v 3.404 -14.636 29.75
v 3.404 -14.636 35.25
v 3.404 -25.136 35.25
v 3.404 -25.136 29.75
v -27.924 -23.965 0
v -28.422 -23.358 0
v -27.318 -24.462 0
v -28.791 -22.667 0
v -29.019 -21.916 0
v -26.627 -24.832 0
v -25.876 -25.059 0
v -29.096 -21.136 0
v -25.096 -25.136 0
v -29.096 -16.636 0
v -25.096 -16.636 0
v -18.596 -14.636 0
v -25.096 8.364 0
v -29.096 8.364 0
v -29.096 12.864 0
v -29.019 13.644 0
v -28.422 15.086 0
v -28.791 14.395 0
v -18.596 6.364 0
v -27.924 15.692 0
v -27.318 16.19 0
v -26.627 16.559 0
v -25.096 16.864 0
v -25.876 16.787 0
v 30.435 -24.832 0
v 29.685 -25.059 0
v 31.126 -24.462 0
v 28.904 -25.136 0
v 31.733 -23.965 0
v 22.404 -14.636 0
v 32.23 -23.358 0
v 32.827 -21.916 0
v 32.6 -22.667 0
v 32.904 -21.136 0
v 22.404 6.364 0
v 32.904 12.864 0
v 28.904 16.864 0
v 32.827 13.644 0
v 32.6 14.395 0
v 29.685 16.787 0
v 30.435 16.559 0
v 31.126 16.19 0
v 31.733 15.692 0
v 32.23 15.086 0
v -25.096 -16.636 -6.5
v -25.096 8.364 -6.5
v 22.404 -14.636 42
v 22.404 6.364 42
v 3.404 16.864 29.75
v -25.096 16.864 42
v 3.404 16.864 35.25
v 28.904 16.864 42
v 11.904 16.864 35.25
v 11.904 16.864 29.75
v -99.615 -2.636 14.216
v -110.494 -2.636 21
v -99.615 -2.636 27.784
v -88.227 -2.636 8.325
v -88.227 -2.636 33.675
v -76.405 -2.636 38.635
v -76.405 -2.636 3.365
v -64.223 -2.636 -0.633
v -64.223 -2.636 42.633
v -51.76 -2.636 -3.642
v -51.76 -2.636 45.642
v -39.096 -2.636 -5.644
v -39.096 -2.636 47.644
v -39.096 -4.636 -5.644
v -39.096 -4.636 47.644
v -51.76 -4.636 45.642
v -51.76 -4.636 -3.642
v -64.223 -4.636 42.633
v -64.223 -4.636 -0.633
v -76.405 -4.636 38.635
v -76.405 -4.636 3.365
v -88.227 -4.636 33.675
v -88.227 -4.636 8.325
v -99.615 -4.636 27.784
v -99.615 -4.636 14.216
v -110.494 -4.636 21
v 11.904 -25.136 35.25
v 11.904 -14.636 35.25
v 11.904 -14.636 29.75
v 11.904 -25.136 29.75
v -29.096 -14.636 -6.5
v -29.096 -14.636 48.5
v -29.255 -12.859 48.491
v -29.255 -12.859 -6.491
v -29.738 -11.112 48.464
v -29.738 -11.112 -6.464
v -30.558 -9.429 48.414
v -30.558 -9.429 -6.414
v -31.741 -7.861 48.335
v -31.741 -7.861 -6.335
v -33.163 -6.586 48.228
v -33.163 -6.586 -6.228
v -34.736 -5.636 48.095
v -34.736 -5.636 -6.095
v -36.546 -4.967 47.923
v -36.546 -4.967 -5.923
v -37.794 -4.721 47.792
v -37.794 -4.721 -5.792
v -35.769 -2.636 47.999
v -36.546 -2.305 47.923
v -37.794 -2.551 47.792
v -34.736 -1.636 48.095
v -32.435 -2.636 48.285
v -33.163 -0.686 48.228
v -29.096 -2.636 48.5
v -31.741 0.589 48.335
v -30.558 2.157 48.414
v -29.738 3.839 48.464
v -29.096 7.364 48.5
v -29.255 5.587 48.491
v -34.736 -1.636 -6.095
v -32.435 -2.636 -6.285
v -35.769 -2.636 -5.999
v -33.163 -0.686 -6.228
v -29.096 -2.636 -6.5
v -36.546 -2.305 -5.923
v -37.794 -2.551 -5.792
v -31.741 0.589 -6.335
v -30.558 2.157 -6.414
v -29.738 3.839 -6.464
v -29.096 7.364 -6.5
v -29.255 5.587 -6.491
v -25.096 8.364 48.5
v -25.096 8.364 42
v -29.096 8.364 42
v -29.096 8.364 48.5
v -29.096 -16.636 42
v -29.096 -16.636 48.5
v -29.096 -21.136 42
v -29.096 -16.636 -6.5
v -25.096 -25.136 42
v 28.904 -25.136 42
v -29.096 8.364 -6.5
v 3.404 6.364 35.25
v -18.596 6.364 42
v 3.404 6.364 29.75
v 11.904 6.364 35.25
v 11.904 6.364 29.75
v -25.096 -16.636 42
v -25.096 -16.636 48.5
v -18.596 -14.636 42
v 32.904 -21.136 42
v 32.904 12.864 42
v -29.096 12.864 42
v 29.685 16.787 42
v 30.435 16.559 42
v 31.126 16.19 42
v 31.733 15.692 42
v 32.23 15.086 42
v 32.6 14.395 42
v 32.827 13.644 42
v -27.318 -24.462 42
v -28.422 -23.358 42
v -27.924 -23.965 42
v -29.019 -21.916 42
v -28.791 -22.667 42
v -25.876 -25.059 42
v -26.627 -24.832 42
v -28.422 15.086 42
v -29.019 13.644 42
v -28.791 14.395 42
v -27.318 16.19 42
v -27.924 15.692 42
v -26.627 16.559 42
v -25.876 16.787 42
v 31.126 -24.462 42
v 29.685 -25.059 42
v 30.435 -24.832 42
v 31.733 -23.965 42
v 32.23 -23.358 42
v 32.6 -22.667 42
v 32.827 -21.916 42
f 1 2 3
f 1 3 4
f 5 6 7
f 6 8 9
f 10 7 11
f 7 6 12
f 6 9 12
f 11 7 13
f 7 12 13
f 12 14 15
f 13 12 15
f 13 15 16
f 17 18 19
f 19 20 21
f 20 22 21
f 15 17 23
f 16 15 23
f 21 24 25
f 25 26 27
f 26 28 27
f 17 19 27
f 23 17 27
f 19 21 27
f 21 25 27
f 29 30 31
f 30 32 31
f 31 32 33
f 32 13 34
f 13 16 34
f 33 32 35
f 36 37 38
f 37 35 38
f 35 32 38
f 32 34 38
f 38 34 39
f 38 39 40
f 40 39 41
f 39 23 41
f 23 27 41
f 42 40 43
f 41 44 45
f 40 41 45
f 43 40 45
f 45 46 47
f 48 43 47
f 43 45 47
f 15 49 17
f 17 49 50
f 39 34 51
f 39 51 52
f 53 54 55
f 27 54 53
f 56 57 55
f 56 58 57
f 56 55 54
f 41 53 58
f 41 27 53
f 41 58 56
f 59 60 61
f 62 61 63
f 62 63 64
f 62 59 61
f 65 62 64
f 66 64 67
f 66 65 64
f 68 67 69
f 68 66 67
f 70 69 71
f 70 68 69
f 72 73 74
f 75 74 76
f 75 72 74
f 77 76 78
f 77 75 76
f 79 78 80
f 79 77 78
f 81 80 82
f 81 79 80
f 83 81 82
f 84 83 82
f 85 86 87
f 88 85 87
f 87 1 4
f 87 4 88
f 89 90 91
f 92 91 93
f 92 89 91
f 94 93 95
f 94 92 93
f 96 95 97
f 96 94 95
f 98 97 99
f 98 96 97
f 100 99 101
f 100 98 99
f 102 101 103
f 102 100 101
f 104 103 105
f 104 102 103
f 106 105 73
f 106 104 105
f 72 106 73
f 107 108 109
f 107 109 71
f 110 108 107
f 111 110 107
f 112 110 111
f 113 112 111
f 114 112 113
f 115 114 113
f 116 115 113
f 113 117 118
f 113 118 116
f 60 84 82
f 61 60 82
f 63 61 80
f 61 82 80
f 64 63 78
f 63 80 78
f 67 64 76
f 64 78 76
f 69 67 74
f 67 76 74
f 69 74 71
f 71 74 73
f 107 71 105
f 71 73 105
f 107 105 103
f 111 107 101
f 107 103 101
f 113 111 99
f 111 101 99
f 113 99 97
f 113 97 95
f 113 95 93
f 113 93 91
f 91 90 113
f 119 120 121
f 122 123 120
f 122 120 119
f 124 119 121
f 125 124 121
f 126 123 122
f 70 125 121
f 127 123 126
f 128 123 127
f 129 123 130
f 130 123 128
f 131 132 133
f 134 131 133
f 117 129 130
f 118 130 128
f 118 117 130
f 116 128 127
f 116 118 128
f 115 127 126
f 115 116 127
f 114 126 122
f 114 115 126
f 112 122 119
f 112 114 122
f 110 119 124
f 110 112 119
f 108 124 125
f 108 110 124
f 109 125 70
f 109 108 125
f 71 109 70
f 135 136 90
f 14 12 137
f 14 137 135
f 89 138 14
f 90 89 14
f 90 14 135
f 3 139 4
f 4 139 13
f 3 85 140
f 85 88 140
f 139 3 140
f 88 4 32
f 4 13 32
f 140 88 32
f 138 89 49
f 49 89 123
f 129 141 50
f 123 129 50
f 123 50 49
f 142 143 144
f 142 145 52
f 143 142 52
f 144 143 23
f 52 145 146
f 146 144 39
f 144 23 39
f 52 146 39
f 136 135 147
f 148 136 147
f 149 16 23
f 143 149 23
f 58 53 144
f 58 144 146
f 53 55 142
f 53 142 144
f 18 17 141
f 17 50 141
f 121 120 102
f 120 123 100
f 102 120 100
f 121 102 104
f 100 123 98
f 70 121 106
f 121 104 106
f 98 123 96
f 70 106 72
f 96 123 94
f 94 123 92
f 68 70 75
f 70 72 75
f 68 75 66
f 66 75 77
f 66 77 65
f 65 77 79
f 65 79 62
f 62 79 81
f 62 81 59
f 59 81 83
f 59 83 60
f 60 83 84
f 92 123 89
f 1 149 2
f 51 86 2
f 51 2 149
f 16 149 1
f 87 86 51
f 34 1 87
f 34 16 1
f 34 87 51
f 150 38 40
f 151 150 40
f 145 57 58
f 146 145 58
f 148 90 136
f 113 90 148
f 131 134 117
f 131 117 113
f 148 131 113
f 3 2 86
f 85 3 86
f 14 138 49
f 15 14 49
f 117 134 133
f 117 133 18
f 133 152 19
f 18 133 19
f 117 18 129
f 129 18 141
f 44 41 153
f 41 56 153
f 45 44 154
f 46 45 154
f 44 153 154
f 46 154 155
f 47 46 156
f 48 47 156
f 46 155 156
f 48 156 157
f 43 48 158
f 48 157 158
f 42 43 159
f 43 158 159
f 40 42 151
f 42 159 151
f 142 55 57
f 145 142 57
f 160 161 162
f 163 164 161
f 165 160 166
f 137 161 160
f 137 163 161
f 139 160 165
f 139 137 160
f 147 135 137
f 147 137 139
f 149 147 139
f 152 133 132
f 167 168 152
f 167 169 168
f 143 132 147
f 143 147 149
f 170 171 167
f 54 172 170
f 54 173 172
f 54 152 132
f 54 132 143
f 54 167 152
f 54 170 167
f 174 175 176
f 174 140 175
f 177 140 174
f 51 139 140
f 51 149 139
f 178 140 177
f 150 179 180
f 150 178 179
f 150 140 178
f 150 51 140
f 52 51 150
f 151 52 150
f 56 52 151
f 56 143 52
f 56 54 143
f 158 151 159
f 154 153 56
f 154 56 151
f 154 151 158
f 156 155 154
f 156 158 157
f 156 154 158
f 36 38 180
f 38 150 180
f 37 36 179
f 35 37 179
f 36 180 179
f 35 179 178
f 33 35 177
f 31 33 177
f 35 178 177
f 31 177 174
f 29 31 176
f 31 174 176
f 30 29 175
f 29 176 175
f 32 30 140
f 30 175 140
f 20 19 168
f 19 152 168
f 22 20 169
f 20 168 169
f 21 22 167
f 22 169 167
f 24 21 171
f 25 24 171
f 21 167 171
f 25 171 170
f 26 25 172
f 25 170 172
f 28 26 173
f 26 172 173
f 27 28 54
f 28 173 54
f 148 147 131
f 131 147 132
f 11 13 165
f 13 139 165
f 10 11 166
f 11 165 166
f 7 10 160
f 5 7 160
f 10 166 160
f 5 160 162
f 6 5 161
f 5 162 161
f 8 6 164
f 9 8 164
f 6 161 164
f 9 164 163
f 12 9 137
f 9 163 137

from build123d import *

# Parameters (mm, degrees)
SKETCH1_W           = 62
SKETCH1_H           = 42
SKETCH1_W_2         = 41
SKETCH1_H_2         = 21
BOSS_EXTRUDE1_DEPTH = 42
SKETCH2_W           = 4
SKETCH2_H           = 25
BOSS_EXTRUDE2_DEPTH = 4.5
SKETCH2_2_W         = 4
SKETCH2_2_H         = 25
BOSS_EXTRUDE3_DEPTH = 45.55
SKETCH3_W           = 4
SKETCH3_H           = 25
BOSS_EXTRUDE6_DEPTH = 2
BOSS_EXTRUDE7_START = -53
SKETCH3_8_W         = 4
SKETCH3_8_H         = 25
BOSS_EXTRUDE7_DEPTH = 53
CUT_EXTRUDE1_START  = -51
CUT_EXTRUDE1_DEPTH  = 51
SKETCH_1_W          = 8.5
SKETCH_1_H          = 5.5
CUT_EXTRUDE_1_DEPTH = 42
FILLET_3_R          = 4
FILLET_4_R          = 4
FILLET_5_R          = 4
FILLET_6_R          = 4
CUT_EXTRUDE3_DEPTH  = 55
BOSS_EXTRUDE8_DEPTH = 21.5
CUT_EXTRUDE4_DEPTH  = 19.5
FILLET_START        = -14.636072995
FILLET_7_DEPTH      = 10.0000001
FILLET_START_2      = -8
FILLET_7_2_DEPTH    = 57
FILLET_8_R          = 10


with BuildPart() as part:
    # Sketch1 → Boss-Extrude1 (new body)
    with BuildSketch(Plane.XY):
        with Locations((1.904162196, -4.136072895)):
            Rectangle(SKETCH1_W, SKETCH1_H)
        with Locations((1.904162196, -4.136072895)):
            Rectangle(SKETCH1_W_2, SKETCH1_H_2, mode=Mode.SUBTRACT)
    extrude(amount=BOSS_EXTRUDE1_DEPTH)

    # Sketch2 → Boss-Extrude2 (add)
    with BuildSketch(Plane.XY.offset(42)):
        with Locations((-27.095837804, -4.136072895)):
            Rectangle(SKETCH2_W, SKETCH2_H)
    extrude(amount=BOSS_EXTRUDE2_DEPTH)

    # Sketch2<2> → Boss-Extrude3 (add)
    with BuildSketch(Plane.XY.offset(42)):
        with Locations((-27.095837804, -4.136072895)):
            Rectangle(SKETCH2_2_W, SKETCH2_2_H)
    extrude(amount=-BOSS_EXTRUDE3_DEPTH)

    # Sketch3 → Boss-Extrude6 (add)
    # profile 1 of 3: a face of its own
    with BuildSketch(Plane.XY.offset(46.5)):
        with BuildLine():
            Line((-60.095837804, 4.463927105), (-60.095837804, 8.363927105))
            ThreePointArc((-60.095837804, 8.363927105), (-72.595837804, -4.136072895), (-60.095837804, -16.636072895))
            Line((-60.095837804, -16.636072895), (-60.095837804, -13.176248856))
            Line((-60.095837804, -13.176248856), (-60.555926168, -13.176248856))
            ThreePointArc((-60.555926168, -13.176248856), (-62.055926168, -11.676248856), (-60.555926168, -10.176248856))
            Line((-60.555926168, -10.176248856), (-60.095837804, -10.176248856))
            Line((-60.095837804, -10.176248856), (-60.095837804, -8.186072895))
            ThreePointArc((-60.095837804, -8.186072895), (-64.145837804, -4.136072895), (-60.095837804, -0.086072895))
            Line((-60.095837804, -0.086072895), (-60.095837804, 1.463927105))
            Line((-60.095837804, 1.463927105), (-60.595837804, 1.463927105))
            ThreePointArc((-60.595837804, 1.463927105), (-62.095837804, 2.963927105), (-60.595837804, 4.463927105))
            Line((-60.595837804, 4.463927105), (-60.095837804, 4.463927105))
        make_face()
        with BuildLine():
            ThreePointArc((-68.695837804, -3.636072895), (-67.195837804, -2.136072895), (-65.695837804, -3.636072895))
            Line((-65.695837804, -3.636072895), (-65.695837804, -4.636072895))
            ThreePointArc((-65.695837804, -4.636072895), (-67.195837804, -6.136072895), (-68.695837804, -4.636072895))
            Line((-68.695837804, -4.636072895), (-68.695837804, -3.636072895))
        make_face(mode=Mode.SUBTRACT)
    # profile 2 of 3: a face of its own
    with BuildSketch(Plane.XY.offset(46.5)):
        with BuildLine():
            Line((-29.095837804, -16.636072895), (-29.095837804, 8.363927105))
            Line((-29.095837804, 8.363927105), (-60.095837804, 8.363927105))
            Line((-60.095837804, 8.363927105), (-60.095837804, 4.463927105))
            Line((-60.095837804, 4.463927105), (-59.595837804, 4.463927105))
            ThreePointArc((-59.595837804, 4.463927105), (-58.095837804, 2.963927105), (-59.595837804, 1.463927105))
            Line((-59.595837804, 1.463927105), (-60.095837804, 1.463927105))
            Line((-60.095837804, 1.463927105), (-60.095837804, -0.086072895))
            ThreePointArc((-60.095837804, -0.086072895), (-57.23205534, -1.272290432), (-56.045837804, -4.136072895))
            ThreePointArc((-56.045837804, -4.136072895), (-57.23205534, -6.999855359), (-60.095837804, -8.186072895))
            Line((-60.095837804, -8.186072895), (-60.095837804, -10.176248856))
            Line((-60.095837804, -10.176248856), (-59.635749439, -10.176248856))
            ThreePointArc((-59.635749439, -10.176248856), (-58.135749439, -11.676248856), (-59.635749439, -13.176248856))
            Line((-59.635749439, -13.176248856), (-60.095837804, -13.176248856))
            Line((-60.095837804, -13.176248856), (-60.095837804, -16.636072895))
            Line((-60.095837804, -16.636072895), (-29.095837804, -16.636072895))
        make_face()
        with BuildLine():
            ThreePointArc((-54.495837804, -3.636072895), (-52.995837804, -2.136072895), (-51.495837804, -3.636072895))
            Line((-51.495837804, -3.636072895), (-51.495837804, -4.636072895))
            ThreePointArc((-51.495837804, -4.636072895), (-52.995837804, -6.136072895), (-54.495837804, -4.636072895))
            Line((-54.495837804, -4.636072895), (-54.495837804, -3.636072895))
        make_face(mode=Mode.SUBTRACT)
    # profile 3 of 3: a face of its own
    with BuildSketch(Plane.XY.offset(46.5)):
        with Locations((-27.095837804, -4.136072895)):
            Rectangle(SKETCH3_W, SKETCH3_H)
    extrude(amount=BOSS_EXTRUDE6_DEPTH)

    # Sketch3<8> → Boss-Extrude7 (add)
    # profile 1 of 3: a face of its own
    with BuildSketch(Plane.XY.offset(46.5).offset(BOSS_EXTRUDE7_START)):
        with BuildLine():
            Line((-60.095837804, 4.463927105), (-60.095837804, 8.363927105))
            ThreePointArc((-60.095837804, 8.363927105), (-72.595837804, -4.136072895), (-60.095837804, -16.636072895))
            Line((-60.095837804, -16.636072895), (-60.095837804, -13.176248856))
            Line((-60.095837804, -13.176248856), (-60.555926168, -13.176248856))
            ThreePointArc((-60.555926168, -13.176248856), (-62.055926168, -11.676248856), (-60.555926168, -10.176248856))
            Line((-60.555926168, -10.176248856), (-60.095837804, -10.176248856))
            Line((-60.095837804, -10.176248856), (-60.095837804, -8.186072895))
            ThreePointArc((-60.095837804, -8.186072895), (-64.145837804, -4.136072895), (-60.095837804, -0.086072895))
            Line((-60.095837804, -0.086072895), (-60.095837804, 1.463927105))
            Line((-60.095837804, 1.463927105), (-60.595837804, 1.463927105))
            ThreePointArc((-60.595837804, 1.463927105), (-62.095837804, 2.963927105), (-60.595837804, 4.463927105))
            Line((-60.595837804, 4.463927105), (-60.095837804, 4.463927105))
        make_face()
        with BuildLine():
            ThreePointArc((-68.695837804, -3.636072895), (-67.195837804, -2.136072895), (-65.695837804, -3.636072895))
            Line((-65.695837804, -3.636072895), (-65.695837804, -4.636072895))
            ThreePointArc((-65.695837804, -4.636072895), (-67.195837804, -6.136072895), (-68.695837804, -4.636072895))
            Line((-68.695837804, -4.636072895), (-68.695837804, -3.636072895))
        make_face(mode=Mode.SUBTRACT)
    # profile 2 of 3: a face of its own
    with BuildSketch(Plane.XY.offset(46.5).offset(BOSS_EXTRUDE7_START)):
        with BuildLine():
            Line((-29.095837804, -16.636072895), (-29.095837804, 8.363927105))
            Line((-29.095837804, 8.363927105), (-60.095837804, 8.363927105))
            Line((-60.095837804, 8.363927105), (-60.095837804, 4.463927105))
            Line((-60.095837804, 4.463927105), (-59.595837804, 4.463927105))
            ThreePointArc((-59.595837804, 4.463927105), (-58.095837804, 2.963927105), (-59.595837804, 1.463927105))
            Line((-59.595837804, 1.463927105), (-60.095837804, 1.463927105))
            Line((-60.095837804, 1.463927105), (-60.095837804, -0.086072895))
            ThreePointArc((-60.095837804, -0.086072895), (-57.23205534, -1.272290432), (-56.045837804, -4.136072895))
            ThreePointArc((-56.045837804, -4.136072895), (-57.23205534, -6.999855359), (-60.095837804, -8.186072895))
            Line((-60.095837804, -8.186072895), (-60.095837804, -10.176248856))
            Line((-60.095837804, -10.176248856), (-59.635749439, -10.176248856))
            ThreePointArc((-59.635749439, -10.176248856), (-58.135749439, -11.676248856), (-59.635749439, -13.176248856))
            Line((-59.635749439, -13.176248856), (-60.095837804, -13.176248856))
            Line((-60.095837804, -13.176248856), (-60.095837804, -16.636072895))
            Line((-60.095837804, -16.636072895), (-29.095837804, -16.636072895))
        make_face()
        with BuildLine():
            ThreePointArc((-54.495837804, -3.636072895), (-52.995837804, -2.136072895), (-51.495837804, -3.636072895))
            Line((-51.495837804, -3.636072895), (-51.495837804, -4.636072895))
            ThreePointArc((-51.495837804, -4.636072895), (-52.995837804, -6.136072895), (-54.495837804, -4.636072895))
            Line((-54.495837804, -4.636072895), (-54.495837804, -3.636072895))
        make_face(mode=Mode.SUBTRACT)
    # profile 3 of 3: a face of its own
    with BuildSketch(Plane.XY.offset(46.5).offset(BOSS_EXTRUDE7_START)):
        with Locations((-27.095837804, -4.136072895)):
            Rectangle(SKETCH3_8_W, SKETCH3_8_H)
    extrude(amount=BOSS_EXTRUDE7_DEPTH)

    # Sketch3<11> → Cut-Extrude1 (cut)
    # profile 1 of 2: a face of its own
    with BuildSketch(Plane.XY.offset(46.5).offset(CUT_EXTRUDE1_START)):
        with BuildLine():
            Line((-29.095837804, -16.636072895), (-29.095837804, 8.363927105))
            Line((-29.095837804, 8.363927105), (-60.095837804, 8.363927105))
            Line((-60.095837804, 8.363927105), (-60.095837804, 4.463927105))
            Line((-60.095837804, 4.463927105), (-59.595837804, 4.463927105))
            ThreePointArc((-59.595837804, 4.463927105), (-58.095837804, 2.963927105), (-59.595837804, 1.463927105))
            Line((-59.595837804, 1.463927105), (-60.095837804, 1.463927105))
            Line((-60.095837804, 1.463927105), (-60.095837804, -0.086072895))
            ThreePointArc((-60.095837804, -0.086072895), (-57.23205534, -1.272290432), (-56.045837804, -4.136072895))
            ThreePointArc((-56.045837804, -4.136072895), (-57.23205534, -6.999855359), (-60.095837804, -8.186072895))
            Line((-60.095837804, -8.186072895), (-60.095837804, -10.176248856))
            Line((-60.095837804, -10.176248856), (-59.635749439, -10.176248856))
            ThreePointArc((-59.635749439, -10.176248856), (-58.135749439, -11.676248856), (-59.635749439, -13.176248856))
            Line((-59.635749439, -13.176248856), (-60.095837804, -13.176248856))
            Line((-60.095837804, -13.176248856), (-60.095837804, -16.636072895))
            Line((-60.095837804, -16.636072895), (-29.095837804, -16.636072895))
        make_face()
        with BuildLine():
            ThreePointArc((-54.495837804, -3.636072895), (-52.995837804, -2.136072895), (-51.495837804, -3.636072895))
            Line((-51.495837804, -3.636072895), (-51.495837804, -4.636072895))
            ThreePointArc((-51.495837804, -4.636072895), (-52.995837804, -6.136072895), (-54.495837804, -4.636072895))
            Line((-54.495837804, -4.636072895), (-54.495837804, -3.636072895))
        make_face(mode=Mode.SUBTRACT)
    # profile 2 of 2: a face of its own
    with BuildSketch(Plane.XY.offset(46.5).offset(CUT_EXTRUDE1_START)):
        with BuildLine():
            Line((-60.095837804, 4.463927105), (-60.095837804, 8.363927105))
            ThreePointArc((-60.095837804, 8.363927105), (-72.595837804, -4.136072895), (-60.095837804, -16.636072895))
            Line((-60.095837804, -16.636072895), (-60.095837804, -13.176248856))
            Line((-60.095837804, -13.176248856), (-60.555926168, -13.176248856))
            ThreePointArc((-60.555926168, -13.176248856), (-62.055926168, -11.676248856), (-60.555926168, -10.176248856))
            Line((-60.555926168, -10.176248856), (-60.095837804, -10.176248856))
            Line((-60.095837804, -10.176248856), (-60.095837804, -8.186072895))
            ThreePointArc((-60.095837804, -8.186072895), (-64.145837804, -4.136072895), (-60.095837804, -0.086072895))
            Line((-60.095837804, -0.086072895), (-60.095837804, 1.463927105))
            Line((-60.095837804, 1.463927105), (-60.595837804, 1.463927105))
            ThreePointArc((-60.595837804, 1.463927105), (-62.095837804, 2.963927105), (-60.595837804, 4.463927105))
            Line((-60.595837804, 4.463927105), (-60.095837804, 4.463927105))
        make_face()
        with BuildLine():
            ThreePointArc((-68.695837804, -3.636072895), (-67.195837804, -2.136072895), (-65.695837804, -3.636072895))
            Line((-65.695837804, -3.636072895), (-65.695837804, -4.636072895))
            ThreePointArc((-65.695837804, -4.636072895), (-67.195837804, -6.136072895), (-68.695837804, -4.636072895))
            Line((-68.695837804, -4.636072895), (-68.695837804, -3.636072895))
        make_face(mode=Mode.SUBTRACT)
    extrude(amount=CUT_EXTRUDE1_DEPTH, mode=Mode.SUBTRACT)

    # 草圖1 → 除料-伸長1 (cut)
    with BuildSketch(Plane(origin=(0, 16.863927105, 0), x_dir=(1, 0, 0), z_dir=(0, 1, 0))):
        with Locations((7.654162196, -32.5)):
            Rectangle(SKETCH_1_W, SKETCH_1_H)
    extrude(amount=-CUT_EXTRUDE_1_DEPTH, mode=Mode.SUBTRACT)

    # 圓角3
    fillet_3_edges = [part.edges().sort_by_distance(p)[0] for p in [
        (-29.095837804, 16.863927105, 21),
    ]]
    fillet(fillet_3_edges, radius=FILLET_3_R)

    # 圓角4
    fillet_4_edges = [part.edges().sort_by_distance(p)[0] for p in [
        (32.904162196, 16.863927105, 21),
    ]]
    fillet(fillet_4_edges, radius=FILLET_4_R)

    # 圓角5
    fillet_5_edges = [part.edges().sort_by_distance(p)[0] for p in [
        (32.904162196, -25.136072895, 21),
    ]]
    fillet(fillet_5_edges, radius=FILLET_5_R)

    # 圓角6
    fillet_6_edges = [part.edges().sort_by_distance(p)[0] for p in [
        (-29.095837804, -25.136072895, 21),
    ]]
    fillet(fillet_6_edges, radius=FILLET_6_R)

    # Sketch8 → Cut-Extrude3 (cut)
    with BuildSketch(Plane(origin=(0, 0, -6.5), x_dir=(-1, 0, 0), z_dir=(0, 0, -1))):
        Polygon((29.095837804, 8.363927105), (72.680638832, 8.363927105), (72.680638832, -16.742132378), (29.095837804, -16.636072895), align=None)
    extrude(amount=-CUT_EXTRUDE3_DEPTH, mode=Mode.SUBTRACT)

    # Sketch9 → Boss-Extrude8 (add)
    with BuildSketch(Plane(origin=(0, 16.863927105, 0), x_dir=(1, 0, 0), z_dir=(0, 1, 0))):
        with BuildLine():
            Line((-29.095837804, -21), (-29.095837804, 6.5))
            ThreePointArc((-29.095837804, 6.5), (-71.675454468, -1.684056641), (-110.494224033, -21))
            Line((-110.494224033, -21), (-29.095837804, -21))
        make_face()
        with BuildLine():
            Line((-29.095837804, -48.5), (-29.095837804, -21))
            Line((-29.095837804, -21), (-110.494224033, -21))
            ThreePointArc((-110.494224033, -21), (-71.675454468, -40.315943359), (-29.095837804, -48.5))
        make_face()
    extrude(amount=-BOSS_EXTRUDE8_DEPTH)

    # Sketch9<4> → Cut-Extrude4 (cut)
    with BuildSketch(Plane(origin=(0, 16.863927105, 0), x_dir=(1, 0, 0), z_dir=(0, 1, 0))):
        with BuildLine():
            Line((-29.095837804, -21), (-29.095837804, 6.5))
            ThreePointArc((-29.095837804, 6.5), (-71.675454468, -1.684056641), (-110.494224033, -21))
            Line((-110.494224033, -21), (-29.095837804, -21))
        make_face()
        with BuildLine():
            Line((-29.095837804, -48.5), (-29.095837804, -21))
            Line((-29.095837804, -21), (-110.494224033, -21))
            ThreePointArc((-110.494224033, -21), (-71.675454468, -40.315943359), (-29.095837804, -48.5))
        make_face()
    extrude(amount=-CUT_EXTRUDE4_DEPTH, mode=Mode.SUBTRACT)

    # 圓角7: read off the stored shape, not the designer's step
    # 圓角7 outline → 圓角7 (add)
    with BuildSketch(Plane(origin=(0, 0, 0), x_dir=(1, 0, 0), z_dir=(0, 1, 0)).offset(FILLET_START)):
        with BuildLine():
            ThreePointArc((-29.095837804, 6.5), (-71.675454468, -1.684056641), (-110.494224033, -21))
            ThreePointArc((-110.494224033, -21), (-71.675454468, -40.315943359), (-29.095837804, -48.5))
            Line((-29.095837804, -48.5), (-29.095837804, 6.5))
        make_face()
    extrude(amount=FILLET_7_DEPTH)

    # Fillet 7 2 outline → Fillet 7 2 (cut)
    with BuildSketch(Plane.XY.offset(FILLET_START_2)):
        with BuildLine():
            Line((-112, -14.636072995), (-29.095837804, -14.636072895))
            ThreePointArc((-29.095837804, -14.636072895), (-32.024769993, -7.565005084), (-39.095837804, -4.636072895))
            Line((-39.095837804, -4.636072895), (-112, -4.636072895))
            Line((-112, -4.636072895), (-112, -14.636072995))
        make_face()
    extrude(amount=FILLET_7_2_DEPTH, mode=Mode.SUBTRACT)

    # 圓角8
    # the kernel refuses this fillet: 10 mm, written as the material it adds along each edge
    with BuildSketch(Plane(origin=(-29.095837804, -2.636072895, 48.5), x_dir=(0, 1, 0), z_dir=(0, 0, -1))) as fillet_8_piece_1_section:
        with BuildLine():
            CenterArc((FILLET_8_R, -FILLET_8_R), FILLET_8_R, 90, 90)
            Line((0, -FILLET_8_R), (0, 0))
            Line((0, 0), (FILLET_8_R, 0))
        make_face()
    fillet_8_piece_1 = extrude(amount=55, mode=Mode.PRIVATE)
    fillet_8_piece_1 = fillet_8_piece_1 & Plane(origin=(-20.463988641, -2.636072895, 153.26699027), x_dir=(-0.053949057267824306, 0, -0.998543689189368), z_dir=(0, 1, 0)) * Cylinder(160, 150, mode=Mode.PRIVATE)
    fillet_8_piece_1 = fillet_8_piece_1 & Plane(origin=(-20.463988641, -2.636072895, -111.26699027), x_dir=(-0.5626889712033937, 0, 0.8266686891893671), z_dir=(0, 1, 0)) * Cylinder(160, 150, mode=Mode.PRIVATE)
    add(fillet_8_piece_1)


solid = part.part
